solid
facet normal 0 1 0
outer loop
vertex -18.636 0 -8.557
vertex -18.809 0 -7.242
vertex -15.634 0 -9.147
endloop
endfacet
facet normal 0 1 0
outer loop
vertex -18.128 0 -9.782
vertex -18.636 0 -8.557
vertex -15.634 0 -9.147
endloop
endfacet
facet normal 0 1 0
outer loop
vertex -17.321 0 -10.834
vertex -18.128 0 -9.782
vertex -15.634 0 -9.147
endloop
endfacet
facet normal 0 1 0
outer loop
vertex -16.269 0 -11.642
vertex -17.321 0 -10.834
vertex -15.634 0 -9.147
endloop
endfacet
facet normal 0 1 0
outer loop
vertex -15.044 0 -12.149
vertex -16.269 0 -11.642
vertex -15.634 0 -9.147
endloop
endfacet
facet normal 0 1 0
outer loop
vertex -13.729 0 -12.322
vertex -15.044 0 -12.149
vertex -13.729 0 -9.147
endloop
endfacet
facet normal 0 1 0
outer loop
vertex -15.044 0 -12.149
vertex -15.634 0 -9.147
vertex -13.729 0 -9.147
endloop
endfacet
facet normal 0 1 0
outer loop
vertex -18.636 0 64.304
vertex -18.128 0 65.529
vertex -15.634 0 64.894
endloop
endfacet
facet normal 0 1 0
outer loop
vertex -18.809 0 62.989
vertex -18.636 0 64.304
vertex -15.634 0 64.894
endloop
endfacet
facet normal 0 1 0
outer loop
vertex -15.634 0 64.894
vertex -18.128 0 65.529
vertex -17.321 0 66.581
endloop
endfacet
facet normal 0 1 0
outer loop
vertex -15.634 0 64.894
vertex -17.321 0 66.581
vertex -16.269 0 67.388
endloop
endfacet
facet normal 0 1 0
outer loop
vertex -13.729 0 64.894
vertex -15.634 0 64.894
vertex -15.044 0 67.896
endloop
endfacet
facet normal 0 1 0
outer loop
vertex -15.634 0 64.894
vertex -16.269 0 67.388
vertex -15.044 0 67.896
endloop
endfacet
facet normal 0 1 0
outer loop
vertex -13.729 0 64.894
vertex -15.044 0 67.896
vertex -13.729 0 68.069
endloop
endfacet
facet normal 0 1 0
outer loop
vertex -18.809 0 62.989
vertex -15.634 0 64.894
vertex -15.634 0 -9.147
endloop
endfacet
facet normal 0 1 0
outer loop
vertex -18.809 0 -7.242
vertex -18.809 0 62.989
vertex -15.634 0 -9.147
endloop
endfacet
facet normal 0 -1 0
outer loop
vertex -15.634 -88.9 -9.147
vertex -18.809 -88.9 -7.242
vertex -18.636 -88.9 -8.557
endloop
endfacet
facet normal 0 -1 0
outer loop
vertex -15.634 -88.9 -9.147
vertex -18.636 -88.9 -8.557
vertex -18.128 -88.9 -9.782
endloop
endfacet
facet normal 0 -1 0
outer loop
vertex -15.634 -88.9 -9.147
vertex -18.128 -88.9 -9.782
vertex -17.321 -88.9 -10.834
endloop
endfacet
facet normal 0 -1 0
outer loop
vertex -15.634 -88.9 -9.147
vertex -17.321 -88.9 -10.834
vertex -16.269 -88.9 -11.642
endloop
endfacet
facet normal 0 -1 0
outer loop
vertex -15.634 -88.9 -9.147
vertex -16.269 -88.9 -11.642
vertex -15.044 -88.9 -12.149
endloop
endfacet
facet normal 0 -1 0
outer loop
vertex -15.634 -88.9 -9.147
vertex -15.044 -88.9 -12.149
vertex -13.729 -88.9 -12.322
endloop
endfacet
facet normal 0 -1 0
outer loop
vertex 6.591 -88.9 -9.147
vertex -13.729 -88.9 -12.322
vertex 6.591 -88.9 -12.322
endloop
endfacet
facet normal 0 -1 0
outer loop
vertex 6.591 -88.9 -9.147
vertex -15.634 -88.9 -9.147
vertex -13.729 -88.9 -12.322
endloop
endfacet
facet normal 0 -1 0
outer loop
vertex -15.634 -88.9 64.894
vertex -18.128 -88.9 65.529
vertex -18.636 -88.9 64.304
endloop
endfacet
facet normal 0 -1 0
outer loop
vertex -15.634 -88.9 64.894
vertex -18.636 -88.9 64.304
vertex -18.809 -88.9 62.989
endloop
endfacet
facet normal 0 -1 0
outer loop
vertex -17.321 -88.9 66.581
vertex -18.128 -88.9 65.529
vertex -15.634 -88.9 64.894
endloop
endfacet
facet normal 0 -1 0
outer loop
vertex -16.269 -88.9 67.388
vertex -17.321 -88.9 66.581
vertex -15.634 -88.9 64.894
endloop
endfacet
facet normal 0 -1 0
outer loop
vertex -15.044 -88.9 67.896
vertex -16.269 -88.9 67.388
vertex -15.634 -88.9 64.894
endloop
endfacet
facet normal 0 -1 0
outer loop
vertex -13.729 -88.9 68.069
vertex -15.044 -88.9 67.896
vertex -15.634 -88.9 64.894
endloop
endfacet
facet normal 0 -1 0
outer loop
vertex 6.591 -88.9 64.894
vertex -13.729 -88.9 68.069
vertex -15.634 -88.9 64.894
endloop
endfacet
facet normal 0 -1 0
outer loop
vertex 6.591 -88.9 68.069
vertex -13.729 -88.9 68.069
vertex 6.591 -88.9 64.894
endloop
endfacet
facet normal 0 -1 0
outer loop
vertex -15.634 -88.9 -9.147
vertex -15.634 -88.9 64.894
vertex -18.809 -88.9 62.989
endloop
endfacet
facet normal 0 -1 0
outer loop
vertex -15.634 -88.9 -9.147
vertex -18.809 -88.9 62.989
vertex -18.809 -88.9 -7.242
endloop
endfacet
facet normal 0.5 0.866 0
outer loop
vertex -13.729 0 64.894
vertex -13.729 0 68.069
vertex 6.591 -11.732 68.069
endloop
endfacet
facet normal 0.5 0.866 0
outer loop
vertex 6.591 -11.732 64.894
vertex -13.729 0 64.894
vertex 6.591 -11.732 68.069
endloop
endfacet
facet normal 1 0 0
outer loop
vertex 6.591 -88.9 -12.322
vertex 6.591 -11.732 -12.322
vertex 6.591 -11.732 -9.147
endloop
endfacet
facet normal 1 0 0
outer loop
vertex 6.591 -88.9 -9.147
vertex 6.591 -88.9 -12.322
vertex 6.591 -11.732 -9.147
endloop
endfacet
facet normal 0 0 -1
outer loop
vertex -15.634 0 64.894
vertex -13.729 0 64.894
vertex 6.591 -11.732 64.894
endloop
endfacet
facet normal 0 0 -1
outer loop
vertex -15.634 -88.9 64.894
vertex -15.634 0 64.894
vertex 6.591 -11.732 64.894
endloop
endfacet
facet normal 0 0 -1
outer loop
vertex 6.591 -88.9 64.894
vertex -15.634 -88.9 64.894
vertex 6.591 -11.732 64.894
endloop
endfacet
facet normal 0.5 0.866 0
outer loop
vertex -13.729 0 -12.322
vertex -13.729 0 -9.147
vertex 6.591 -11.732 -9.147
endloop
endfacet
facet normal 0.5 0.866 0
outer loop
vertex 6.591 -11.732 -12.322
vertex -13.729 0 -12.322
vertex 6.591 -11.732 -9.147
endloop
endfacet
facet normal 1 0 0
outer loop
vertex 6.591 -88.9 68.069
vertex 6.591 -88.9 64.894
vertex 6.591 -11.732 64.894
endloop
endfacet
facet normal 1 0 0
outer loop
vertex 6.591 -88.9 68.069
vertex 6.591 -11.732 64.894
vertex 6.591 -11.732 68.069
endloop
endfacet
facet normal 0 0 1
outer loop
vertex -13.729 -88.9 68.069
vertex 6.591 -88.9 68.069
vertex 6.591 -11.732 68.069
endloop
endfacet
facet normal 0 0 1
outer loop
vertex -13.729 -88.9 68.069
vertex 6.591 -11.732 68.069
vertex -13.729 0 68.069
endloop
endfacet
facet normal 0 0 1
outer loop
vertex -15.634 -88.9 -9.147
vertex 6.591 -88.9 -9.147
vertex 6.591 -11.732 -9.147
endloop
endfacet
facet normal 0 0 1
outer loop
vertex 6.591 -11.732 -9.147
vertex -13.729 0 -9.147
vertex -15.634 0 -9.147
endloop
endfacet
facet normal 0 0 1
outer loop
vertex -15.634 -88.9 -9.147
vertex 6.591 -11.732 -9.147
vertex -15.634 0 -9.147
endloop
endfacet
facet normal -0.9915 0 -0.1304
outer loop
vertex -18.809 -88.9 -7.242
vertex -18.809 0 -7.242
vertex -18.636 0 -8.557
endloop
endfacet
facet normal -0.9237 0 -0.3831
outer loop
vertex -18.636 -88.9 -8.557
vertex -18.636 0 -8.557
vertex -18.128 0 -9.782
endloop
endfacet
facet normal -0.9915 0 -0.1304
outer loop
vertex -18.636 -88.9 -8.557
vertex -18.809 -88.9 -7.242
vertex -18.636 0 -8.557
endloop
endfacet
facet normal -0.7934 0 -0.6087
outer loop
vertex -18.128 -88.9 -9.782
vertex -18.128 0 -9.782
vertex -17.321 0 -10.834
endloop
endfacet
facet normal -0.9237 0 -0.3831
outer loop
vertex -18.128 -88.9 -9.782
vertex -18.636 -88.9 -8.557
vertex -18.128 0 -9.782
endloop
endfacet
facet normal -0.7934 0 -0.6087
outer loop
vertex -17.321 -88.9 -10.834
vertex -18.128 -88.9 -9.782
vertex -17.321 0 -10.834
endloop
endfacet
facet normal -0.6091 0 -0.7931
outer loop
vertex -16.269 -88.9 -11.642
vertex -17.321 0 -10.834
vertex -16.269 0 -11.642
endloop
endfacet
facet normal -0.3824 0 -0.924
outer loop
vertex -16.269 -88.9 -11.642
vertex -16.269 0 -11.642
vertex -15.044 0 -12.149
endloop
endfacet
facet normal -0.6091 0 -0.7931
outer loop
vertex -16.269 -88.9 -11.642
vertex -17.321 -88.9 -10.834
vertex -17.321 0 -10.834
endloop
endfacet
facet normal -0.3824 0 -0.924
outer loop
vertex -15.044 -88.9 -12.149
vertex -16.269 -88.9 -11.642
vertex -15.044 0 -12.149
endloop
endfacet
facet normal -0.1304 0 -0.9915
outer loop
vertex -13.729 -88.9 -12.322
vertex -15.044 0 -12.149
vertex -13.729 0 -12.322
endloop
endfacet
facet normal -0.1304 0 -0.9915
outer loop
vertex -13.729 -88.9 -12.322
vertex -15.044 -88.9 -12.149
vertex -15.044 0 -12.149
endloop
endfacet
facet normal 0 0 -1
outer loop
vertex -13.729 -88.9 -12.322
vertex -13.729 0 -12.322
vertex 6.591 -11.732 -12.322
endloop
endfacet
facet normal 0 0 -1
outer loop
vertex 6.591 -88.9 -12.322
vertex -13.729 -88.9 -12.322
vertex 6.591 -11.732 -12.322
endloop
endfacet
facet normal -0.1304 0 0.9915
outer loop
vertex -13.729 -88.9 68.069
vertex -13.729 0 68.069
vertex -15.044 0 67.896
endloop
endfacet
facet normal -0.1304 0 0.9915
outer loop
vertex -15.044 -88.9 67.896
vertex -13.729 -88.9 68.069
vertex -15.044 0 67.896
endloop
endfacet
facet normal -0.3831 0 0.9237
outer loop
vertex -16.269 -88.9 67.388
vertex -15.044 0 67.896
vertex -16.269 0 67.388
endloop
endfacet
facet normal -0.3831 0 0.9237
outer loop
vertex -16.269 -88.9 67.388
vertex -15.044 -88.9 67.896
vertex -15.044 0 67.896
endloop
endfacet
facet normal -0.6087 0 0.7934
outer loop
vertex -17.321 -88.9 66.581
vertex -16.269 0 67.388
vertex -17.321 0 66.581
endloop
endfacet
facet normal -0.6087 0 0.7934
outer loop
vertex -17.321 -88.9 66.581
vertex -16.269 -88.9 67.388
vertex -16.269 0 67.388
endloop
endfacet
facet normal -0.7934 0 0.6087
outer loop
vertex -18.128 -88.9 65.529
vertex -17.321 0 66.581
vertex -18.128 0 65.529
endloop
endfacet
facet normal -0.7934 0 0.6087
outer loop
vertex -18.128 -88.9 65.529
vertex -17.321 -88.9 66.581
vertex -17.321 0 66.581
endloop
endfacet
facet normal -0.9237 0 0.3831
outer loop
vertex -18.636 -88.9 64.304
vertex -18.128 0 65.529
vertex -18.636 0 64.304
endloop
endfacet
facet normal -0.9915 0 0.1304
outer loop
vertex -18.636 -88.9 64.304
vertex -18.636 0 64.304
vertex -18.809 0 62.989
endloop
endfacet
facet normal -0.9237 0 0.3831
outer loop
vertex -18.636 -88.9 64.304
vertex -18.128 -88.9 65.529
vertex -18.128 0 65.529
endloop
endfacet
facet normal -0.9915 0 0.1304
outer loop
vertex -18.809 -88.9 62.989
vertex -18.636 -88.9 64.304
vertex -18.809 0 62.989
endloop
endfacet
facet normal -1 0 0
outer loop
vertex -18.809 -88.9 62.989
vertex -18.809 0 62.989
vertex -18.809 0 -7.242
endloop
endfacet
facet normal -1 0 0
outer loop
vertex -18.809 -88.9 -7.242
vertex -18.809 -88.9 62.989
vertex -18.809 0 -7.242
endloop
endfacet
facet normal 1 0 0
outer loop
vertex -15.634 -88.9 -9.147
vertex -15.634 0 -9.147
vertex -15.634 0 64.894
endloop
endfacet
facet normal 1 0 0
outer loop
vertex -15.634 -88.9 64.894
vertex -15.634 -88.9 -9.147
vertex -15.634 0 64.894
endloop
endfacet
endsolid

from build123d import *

# Parameters (mm, degrees)
F1_DEPTH = 88.9
F2_R     = 5.08
F4_DEPTH = 103.378


with BuildPart() as f1:
    # F0 (on Front) → F1 (new body)
    with BuildSketch(Plane.XZ):
        Polygon((6.59128, 64.89383), (6.59128, 68.06883), (-18.80872, 68.06883), (-18.80872, -12.32217), (6.59128, -12.32217), (6.59128, -9.14717), (-15.63372, -9.14717), (-15.63372, 64.89383), align=None)
    extrude(amount=F1_DEPTH)

    # F2
    f2_edges = [f1.edges().sort_by_distance(p)[0] for p in [
        (-18.80872, -44.45, 68.06883),
        (-18.80872, -44.45, -12.32217),
    ]]
    fillet(f2_edges, radius=F2_R)

    # F3 (on face) → F4 (cut)
    with BuildSketch(Plane.XY.offset(68.06883)):
        Polygon((6.59128, 0), (-13.72872, 0), (6.59128, -11.731757), align=None)
    extrude(amount=-F4_DEPTH, mode=Mode.SUBTRACT)


solid = f1.part
